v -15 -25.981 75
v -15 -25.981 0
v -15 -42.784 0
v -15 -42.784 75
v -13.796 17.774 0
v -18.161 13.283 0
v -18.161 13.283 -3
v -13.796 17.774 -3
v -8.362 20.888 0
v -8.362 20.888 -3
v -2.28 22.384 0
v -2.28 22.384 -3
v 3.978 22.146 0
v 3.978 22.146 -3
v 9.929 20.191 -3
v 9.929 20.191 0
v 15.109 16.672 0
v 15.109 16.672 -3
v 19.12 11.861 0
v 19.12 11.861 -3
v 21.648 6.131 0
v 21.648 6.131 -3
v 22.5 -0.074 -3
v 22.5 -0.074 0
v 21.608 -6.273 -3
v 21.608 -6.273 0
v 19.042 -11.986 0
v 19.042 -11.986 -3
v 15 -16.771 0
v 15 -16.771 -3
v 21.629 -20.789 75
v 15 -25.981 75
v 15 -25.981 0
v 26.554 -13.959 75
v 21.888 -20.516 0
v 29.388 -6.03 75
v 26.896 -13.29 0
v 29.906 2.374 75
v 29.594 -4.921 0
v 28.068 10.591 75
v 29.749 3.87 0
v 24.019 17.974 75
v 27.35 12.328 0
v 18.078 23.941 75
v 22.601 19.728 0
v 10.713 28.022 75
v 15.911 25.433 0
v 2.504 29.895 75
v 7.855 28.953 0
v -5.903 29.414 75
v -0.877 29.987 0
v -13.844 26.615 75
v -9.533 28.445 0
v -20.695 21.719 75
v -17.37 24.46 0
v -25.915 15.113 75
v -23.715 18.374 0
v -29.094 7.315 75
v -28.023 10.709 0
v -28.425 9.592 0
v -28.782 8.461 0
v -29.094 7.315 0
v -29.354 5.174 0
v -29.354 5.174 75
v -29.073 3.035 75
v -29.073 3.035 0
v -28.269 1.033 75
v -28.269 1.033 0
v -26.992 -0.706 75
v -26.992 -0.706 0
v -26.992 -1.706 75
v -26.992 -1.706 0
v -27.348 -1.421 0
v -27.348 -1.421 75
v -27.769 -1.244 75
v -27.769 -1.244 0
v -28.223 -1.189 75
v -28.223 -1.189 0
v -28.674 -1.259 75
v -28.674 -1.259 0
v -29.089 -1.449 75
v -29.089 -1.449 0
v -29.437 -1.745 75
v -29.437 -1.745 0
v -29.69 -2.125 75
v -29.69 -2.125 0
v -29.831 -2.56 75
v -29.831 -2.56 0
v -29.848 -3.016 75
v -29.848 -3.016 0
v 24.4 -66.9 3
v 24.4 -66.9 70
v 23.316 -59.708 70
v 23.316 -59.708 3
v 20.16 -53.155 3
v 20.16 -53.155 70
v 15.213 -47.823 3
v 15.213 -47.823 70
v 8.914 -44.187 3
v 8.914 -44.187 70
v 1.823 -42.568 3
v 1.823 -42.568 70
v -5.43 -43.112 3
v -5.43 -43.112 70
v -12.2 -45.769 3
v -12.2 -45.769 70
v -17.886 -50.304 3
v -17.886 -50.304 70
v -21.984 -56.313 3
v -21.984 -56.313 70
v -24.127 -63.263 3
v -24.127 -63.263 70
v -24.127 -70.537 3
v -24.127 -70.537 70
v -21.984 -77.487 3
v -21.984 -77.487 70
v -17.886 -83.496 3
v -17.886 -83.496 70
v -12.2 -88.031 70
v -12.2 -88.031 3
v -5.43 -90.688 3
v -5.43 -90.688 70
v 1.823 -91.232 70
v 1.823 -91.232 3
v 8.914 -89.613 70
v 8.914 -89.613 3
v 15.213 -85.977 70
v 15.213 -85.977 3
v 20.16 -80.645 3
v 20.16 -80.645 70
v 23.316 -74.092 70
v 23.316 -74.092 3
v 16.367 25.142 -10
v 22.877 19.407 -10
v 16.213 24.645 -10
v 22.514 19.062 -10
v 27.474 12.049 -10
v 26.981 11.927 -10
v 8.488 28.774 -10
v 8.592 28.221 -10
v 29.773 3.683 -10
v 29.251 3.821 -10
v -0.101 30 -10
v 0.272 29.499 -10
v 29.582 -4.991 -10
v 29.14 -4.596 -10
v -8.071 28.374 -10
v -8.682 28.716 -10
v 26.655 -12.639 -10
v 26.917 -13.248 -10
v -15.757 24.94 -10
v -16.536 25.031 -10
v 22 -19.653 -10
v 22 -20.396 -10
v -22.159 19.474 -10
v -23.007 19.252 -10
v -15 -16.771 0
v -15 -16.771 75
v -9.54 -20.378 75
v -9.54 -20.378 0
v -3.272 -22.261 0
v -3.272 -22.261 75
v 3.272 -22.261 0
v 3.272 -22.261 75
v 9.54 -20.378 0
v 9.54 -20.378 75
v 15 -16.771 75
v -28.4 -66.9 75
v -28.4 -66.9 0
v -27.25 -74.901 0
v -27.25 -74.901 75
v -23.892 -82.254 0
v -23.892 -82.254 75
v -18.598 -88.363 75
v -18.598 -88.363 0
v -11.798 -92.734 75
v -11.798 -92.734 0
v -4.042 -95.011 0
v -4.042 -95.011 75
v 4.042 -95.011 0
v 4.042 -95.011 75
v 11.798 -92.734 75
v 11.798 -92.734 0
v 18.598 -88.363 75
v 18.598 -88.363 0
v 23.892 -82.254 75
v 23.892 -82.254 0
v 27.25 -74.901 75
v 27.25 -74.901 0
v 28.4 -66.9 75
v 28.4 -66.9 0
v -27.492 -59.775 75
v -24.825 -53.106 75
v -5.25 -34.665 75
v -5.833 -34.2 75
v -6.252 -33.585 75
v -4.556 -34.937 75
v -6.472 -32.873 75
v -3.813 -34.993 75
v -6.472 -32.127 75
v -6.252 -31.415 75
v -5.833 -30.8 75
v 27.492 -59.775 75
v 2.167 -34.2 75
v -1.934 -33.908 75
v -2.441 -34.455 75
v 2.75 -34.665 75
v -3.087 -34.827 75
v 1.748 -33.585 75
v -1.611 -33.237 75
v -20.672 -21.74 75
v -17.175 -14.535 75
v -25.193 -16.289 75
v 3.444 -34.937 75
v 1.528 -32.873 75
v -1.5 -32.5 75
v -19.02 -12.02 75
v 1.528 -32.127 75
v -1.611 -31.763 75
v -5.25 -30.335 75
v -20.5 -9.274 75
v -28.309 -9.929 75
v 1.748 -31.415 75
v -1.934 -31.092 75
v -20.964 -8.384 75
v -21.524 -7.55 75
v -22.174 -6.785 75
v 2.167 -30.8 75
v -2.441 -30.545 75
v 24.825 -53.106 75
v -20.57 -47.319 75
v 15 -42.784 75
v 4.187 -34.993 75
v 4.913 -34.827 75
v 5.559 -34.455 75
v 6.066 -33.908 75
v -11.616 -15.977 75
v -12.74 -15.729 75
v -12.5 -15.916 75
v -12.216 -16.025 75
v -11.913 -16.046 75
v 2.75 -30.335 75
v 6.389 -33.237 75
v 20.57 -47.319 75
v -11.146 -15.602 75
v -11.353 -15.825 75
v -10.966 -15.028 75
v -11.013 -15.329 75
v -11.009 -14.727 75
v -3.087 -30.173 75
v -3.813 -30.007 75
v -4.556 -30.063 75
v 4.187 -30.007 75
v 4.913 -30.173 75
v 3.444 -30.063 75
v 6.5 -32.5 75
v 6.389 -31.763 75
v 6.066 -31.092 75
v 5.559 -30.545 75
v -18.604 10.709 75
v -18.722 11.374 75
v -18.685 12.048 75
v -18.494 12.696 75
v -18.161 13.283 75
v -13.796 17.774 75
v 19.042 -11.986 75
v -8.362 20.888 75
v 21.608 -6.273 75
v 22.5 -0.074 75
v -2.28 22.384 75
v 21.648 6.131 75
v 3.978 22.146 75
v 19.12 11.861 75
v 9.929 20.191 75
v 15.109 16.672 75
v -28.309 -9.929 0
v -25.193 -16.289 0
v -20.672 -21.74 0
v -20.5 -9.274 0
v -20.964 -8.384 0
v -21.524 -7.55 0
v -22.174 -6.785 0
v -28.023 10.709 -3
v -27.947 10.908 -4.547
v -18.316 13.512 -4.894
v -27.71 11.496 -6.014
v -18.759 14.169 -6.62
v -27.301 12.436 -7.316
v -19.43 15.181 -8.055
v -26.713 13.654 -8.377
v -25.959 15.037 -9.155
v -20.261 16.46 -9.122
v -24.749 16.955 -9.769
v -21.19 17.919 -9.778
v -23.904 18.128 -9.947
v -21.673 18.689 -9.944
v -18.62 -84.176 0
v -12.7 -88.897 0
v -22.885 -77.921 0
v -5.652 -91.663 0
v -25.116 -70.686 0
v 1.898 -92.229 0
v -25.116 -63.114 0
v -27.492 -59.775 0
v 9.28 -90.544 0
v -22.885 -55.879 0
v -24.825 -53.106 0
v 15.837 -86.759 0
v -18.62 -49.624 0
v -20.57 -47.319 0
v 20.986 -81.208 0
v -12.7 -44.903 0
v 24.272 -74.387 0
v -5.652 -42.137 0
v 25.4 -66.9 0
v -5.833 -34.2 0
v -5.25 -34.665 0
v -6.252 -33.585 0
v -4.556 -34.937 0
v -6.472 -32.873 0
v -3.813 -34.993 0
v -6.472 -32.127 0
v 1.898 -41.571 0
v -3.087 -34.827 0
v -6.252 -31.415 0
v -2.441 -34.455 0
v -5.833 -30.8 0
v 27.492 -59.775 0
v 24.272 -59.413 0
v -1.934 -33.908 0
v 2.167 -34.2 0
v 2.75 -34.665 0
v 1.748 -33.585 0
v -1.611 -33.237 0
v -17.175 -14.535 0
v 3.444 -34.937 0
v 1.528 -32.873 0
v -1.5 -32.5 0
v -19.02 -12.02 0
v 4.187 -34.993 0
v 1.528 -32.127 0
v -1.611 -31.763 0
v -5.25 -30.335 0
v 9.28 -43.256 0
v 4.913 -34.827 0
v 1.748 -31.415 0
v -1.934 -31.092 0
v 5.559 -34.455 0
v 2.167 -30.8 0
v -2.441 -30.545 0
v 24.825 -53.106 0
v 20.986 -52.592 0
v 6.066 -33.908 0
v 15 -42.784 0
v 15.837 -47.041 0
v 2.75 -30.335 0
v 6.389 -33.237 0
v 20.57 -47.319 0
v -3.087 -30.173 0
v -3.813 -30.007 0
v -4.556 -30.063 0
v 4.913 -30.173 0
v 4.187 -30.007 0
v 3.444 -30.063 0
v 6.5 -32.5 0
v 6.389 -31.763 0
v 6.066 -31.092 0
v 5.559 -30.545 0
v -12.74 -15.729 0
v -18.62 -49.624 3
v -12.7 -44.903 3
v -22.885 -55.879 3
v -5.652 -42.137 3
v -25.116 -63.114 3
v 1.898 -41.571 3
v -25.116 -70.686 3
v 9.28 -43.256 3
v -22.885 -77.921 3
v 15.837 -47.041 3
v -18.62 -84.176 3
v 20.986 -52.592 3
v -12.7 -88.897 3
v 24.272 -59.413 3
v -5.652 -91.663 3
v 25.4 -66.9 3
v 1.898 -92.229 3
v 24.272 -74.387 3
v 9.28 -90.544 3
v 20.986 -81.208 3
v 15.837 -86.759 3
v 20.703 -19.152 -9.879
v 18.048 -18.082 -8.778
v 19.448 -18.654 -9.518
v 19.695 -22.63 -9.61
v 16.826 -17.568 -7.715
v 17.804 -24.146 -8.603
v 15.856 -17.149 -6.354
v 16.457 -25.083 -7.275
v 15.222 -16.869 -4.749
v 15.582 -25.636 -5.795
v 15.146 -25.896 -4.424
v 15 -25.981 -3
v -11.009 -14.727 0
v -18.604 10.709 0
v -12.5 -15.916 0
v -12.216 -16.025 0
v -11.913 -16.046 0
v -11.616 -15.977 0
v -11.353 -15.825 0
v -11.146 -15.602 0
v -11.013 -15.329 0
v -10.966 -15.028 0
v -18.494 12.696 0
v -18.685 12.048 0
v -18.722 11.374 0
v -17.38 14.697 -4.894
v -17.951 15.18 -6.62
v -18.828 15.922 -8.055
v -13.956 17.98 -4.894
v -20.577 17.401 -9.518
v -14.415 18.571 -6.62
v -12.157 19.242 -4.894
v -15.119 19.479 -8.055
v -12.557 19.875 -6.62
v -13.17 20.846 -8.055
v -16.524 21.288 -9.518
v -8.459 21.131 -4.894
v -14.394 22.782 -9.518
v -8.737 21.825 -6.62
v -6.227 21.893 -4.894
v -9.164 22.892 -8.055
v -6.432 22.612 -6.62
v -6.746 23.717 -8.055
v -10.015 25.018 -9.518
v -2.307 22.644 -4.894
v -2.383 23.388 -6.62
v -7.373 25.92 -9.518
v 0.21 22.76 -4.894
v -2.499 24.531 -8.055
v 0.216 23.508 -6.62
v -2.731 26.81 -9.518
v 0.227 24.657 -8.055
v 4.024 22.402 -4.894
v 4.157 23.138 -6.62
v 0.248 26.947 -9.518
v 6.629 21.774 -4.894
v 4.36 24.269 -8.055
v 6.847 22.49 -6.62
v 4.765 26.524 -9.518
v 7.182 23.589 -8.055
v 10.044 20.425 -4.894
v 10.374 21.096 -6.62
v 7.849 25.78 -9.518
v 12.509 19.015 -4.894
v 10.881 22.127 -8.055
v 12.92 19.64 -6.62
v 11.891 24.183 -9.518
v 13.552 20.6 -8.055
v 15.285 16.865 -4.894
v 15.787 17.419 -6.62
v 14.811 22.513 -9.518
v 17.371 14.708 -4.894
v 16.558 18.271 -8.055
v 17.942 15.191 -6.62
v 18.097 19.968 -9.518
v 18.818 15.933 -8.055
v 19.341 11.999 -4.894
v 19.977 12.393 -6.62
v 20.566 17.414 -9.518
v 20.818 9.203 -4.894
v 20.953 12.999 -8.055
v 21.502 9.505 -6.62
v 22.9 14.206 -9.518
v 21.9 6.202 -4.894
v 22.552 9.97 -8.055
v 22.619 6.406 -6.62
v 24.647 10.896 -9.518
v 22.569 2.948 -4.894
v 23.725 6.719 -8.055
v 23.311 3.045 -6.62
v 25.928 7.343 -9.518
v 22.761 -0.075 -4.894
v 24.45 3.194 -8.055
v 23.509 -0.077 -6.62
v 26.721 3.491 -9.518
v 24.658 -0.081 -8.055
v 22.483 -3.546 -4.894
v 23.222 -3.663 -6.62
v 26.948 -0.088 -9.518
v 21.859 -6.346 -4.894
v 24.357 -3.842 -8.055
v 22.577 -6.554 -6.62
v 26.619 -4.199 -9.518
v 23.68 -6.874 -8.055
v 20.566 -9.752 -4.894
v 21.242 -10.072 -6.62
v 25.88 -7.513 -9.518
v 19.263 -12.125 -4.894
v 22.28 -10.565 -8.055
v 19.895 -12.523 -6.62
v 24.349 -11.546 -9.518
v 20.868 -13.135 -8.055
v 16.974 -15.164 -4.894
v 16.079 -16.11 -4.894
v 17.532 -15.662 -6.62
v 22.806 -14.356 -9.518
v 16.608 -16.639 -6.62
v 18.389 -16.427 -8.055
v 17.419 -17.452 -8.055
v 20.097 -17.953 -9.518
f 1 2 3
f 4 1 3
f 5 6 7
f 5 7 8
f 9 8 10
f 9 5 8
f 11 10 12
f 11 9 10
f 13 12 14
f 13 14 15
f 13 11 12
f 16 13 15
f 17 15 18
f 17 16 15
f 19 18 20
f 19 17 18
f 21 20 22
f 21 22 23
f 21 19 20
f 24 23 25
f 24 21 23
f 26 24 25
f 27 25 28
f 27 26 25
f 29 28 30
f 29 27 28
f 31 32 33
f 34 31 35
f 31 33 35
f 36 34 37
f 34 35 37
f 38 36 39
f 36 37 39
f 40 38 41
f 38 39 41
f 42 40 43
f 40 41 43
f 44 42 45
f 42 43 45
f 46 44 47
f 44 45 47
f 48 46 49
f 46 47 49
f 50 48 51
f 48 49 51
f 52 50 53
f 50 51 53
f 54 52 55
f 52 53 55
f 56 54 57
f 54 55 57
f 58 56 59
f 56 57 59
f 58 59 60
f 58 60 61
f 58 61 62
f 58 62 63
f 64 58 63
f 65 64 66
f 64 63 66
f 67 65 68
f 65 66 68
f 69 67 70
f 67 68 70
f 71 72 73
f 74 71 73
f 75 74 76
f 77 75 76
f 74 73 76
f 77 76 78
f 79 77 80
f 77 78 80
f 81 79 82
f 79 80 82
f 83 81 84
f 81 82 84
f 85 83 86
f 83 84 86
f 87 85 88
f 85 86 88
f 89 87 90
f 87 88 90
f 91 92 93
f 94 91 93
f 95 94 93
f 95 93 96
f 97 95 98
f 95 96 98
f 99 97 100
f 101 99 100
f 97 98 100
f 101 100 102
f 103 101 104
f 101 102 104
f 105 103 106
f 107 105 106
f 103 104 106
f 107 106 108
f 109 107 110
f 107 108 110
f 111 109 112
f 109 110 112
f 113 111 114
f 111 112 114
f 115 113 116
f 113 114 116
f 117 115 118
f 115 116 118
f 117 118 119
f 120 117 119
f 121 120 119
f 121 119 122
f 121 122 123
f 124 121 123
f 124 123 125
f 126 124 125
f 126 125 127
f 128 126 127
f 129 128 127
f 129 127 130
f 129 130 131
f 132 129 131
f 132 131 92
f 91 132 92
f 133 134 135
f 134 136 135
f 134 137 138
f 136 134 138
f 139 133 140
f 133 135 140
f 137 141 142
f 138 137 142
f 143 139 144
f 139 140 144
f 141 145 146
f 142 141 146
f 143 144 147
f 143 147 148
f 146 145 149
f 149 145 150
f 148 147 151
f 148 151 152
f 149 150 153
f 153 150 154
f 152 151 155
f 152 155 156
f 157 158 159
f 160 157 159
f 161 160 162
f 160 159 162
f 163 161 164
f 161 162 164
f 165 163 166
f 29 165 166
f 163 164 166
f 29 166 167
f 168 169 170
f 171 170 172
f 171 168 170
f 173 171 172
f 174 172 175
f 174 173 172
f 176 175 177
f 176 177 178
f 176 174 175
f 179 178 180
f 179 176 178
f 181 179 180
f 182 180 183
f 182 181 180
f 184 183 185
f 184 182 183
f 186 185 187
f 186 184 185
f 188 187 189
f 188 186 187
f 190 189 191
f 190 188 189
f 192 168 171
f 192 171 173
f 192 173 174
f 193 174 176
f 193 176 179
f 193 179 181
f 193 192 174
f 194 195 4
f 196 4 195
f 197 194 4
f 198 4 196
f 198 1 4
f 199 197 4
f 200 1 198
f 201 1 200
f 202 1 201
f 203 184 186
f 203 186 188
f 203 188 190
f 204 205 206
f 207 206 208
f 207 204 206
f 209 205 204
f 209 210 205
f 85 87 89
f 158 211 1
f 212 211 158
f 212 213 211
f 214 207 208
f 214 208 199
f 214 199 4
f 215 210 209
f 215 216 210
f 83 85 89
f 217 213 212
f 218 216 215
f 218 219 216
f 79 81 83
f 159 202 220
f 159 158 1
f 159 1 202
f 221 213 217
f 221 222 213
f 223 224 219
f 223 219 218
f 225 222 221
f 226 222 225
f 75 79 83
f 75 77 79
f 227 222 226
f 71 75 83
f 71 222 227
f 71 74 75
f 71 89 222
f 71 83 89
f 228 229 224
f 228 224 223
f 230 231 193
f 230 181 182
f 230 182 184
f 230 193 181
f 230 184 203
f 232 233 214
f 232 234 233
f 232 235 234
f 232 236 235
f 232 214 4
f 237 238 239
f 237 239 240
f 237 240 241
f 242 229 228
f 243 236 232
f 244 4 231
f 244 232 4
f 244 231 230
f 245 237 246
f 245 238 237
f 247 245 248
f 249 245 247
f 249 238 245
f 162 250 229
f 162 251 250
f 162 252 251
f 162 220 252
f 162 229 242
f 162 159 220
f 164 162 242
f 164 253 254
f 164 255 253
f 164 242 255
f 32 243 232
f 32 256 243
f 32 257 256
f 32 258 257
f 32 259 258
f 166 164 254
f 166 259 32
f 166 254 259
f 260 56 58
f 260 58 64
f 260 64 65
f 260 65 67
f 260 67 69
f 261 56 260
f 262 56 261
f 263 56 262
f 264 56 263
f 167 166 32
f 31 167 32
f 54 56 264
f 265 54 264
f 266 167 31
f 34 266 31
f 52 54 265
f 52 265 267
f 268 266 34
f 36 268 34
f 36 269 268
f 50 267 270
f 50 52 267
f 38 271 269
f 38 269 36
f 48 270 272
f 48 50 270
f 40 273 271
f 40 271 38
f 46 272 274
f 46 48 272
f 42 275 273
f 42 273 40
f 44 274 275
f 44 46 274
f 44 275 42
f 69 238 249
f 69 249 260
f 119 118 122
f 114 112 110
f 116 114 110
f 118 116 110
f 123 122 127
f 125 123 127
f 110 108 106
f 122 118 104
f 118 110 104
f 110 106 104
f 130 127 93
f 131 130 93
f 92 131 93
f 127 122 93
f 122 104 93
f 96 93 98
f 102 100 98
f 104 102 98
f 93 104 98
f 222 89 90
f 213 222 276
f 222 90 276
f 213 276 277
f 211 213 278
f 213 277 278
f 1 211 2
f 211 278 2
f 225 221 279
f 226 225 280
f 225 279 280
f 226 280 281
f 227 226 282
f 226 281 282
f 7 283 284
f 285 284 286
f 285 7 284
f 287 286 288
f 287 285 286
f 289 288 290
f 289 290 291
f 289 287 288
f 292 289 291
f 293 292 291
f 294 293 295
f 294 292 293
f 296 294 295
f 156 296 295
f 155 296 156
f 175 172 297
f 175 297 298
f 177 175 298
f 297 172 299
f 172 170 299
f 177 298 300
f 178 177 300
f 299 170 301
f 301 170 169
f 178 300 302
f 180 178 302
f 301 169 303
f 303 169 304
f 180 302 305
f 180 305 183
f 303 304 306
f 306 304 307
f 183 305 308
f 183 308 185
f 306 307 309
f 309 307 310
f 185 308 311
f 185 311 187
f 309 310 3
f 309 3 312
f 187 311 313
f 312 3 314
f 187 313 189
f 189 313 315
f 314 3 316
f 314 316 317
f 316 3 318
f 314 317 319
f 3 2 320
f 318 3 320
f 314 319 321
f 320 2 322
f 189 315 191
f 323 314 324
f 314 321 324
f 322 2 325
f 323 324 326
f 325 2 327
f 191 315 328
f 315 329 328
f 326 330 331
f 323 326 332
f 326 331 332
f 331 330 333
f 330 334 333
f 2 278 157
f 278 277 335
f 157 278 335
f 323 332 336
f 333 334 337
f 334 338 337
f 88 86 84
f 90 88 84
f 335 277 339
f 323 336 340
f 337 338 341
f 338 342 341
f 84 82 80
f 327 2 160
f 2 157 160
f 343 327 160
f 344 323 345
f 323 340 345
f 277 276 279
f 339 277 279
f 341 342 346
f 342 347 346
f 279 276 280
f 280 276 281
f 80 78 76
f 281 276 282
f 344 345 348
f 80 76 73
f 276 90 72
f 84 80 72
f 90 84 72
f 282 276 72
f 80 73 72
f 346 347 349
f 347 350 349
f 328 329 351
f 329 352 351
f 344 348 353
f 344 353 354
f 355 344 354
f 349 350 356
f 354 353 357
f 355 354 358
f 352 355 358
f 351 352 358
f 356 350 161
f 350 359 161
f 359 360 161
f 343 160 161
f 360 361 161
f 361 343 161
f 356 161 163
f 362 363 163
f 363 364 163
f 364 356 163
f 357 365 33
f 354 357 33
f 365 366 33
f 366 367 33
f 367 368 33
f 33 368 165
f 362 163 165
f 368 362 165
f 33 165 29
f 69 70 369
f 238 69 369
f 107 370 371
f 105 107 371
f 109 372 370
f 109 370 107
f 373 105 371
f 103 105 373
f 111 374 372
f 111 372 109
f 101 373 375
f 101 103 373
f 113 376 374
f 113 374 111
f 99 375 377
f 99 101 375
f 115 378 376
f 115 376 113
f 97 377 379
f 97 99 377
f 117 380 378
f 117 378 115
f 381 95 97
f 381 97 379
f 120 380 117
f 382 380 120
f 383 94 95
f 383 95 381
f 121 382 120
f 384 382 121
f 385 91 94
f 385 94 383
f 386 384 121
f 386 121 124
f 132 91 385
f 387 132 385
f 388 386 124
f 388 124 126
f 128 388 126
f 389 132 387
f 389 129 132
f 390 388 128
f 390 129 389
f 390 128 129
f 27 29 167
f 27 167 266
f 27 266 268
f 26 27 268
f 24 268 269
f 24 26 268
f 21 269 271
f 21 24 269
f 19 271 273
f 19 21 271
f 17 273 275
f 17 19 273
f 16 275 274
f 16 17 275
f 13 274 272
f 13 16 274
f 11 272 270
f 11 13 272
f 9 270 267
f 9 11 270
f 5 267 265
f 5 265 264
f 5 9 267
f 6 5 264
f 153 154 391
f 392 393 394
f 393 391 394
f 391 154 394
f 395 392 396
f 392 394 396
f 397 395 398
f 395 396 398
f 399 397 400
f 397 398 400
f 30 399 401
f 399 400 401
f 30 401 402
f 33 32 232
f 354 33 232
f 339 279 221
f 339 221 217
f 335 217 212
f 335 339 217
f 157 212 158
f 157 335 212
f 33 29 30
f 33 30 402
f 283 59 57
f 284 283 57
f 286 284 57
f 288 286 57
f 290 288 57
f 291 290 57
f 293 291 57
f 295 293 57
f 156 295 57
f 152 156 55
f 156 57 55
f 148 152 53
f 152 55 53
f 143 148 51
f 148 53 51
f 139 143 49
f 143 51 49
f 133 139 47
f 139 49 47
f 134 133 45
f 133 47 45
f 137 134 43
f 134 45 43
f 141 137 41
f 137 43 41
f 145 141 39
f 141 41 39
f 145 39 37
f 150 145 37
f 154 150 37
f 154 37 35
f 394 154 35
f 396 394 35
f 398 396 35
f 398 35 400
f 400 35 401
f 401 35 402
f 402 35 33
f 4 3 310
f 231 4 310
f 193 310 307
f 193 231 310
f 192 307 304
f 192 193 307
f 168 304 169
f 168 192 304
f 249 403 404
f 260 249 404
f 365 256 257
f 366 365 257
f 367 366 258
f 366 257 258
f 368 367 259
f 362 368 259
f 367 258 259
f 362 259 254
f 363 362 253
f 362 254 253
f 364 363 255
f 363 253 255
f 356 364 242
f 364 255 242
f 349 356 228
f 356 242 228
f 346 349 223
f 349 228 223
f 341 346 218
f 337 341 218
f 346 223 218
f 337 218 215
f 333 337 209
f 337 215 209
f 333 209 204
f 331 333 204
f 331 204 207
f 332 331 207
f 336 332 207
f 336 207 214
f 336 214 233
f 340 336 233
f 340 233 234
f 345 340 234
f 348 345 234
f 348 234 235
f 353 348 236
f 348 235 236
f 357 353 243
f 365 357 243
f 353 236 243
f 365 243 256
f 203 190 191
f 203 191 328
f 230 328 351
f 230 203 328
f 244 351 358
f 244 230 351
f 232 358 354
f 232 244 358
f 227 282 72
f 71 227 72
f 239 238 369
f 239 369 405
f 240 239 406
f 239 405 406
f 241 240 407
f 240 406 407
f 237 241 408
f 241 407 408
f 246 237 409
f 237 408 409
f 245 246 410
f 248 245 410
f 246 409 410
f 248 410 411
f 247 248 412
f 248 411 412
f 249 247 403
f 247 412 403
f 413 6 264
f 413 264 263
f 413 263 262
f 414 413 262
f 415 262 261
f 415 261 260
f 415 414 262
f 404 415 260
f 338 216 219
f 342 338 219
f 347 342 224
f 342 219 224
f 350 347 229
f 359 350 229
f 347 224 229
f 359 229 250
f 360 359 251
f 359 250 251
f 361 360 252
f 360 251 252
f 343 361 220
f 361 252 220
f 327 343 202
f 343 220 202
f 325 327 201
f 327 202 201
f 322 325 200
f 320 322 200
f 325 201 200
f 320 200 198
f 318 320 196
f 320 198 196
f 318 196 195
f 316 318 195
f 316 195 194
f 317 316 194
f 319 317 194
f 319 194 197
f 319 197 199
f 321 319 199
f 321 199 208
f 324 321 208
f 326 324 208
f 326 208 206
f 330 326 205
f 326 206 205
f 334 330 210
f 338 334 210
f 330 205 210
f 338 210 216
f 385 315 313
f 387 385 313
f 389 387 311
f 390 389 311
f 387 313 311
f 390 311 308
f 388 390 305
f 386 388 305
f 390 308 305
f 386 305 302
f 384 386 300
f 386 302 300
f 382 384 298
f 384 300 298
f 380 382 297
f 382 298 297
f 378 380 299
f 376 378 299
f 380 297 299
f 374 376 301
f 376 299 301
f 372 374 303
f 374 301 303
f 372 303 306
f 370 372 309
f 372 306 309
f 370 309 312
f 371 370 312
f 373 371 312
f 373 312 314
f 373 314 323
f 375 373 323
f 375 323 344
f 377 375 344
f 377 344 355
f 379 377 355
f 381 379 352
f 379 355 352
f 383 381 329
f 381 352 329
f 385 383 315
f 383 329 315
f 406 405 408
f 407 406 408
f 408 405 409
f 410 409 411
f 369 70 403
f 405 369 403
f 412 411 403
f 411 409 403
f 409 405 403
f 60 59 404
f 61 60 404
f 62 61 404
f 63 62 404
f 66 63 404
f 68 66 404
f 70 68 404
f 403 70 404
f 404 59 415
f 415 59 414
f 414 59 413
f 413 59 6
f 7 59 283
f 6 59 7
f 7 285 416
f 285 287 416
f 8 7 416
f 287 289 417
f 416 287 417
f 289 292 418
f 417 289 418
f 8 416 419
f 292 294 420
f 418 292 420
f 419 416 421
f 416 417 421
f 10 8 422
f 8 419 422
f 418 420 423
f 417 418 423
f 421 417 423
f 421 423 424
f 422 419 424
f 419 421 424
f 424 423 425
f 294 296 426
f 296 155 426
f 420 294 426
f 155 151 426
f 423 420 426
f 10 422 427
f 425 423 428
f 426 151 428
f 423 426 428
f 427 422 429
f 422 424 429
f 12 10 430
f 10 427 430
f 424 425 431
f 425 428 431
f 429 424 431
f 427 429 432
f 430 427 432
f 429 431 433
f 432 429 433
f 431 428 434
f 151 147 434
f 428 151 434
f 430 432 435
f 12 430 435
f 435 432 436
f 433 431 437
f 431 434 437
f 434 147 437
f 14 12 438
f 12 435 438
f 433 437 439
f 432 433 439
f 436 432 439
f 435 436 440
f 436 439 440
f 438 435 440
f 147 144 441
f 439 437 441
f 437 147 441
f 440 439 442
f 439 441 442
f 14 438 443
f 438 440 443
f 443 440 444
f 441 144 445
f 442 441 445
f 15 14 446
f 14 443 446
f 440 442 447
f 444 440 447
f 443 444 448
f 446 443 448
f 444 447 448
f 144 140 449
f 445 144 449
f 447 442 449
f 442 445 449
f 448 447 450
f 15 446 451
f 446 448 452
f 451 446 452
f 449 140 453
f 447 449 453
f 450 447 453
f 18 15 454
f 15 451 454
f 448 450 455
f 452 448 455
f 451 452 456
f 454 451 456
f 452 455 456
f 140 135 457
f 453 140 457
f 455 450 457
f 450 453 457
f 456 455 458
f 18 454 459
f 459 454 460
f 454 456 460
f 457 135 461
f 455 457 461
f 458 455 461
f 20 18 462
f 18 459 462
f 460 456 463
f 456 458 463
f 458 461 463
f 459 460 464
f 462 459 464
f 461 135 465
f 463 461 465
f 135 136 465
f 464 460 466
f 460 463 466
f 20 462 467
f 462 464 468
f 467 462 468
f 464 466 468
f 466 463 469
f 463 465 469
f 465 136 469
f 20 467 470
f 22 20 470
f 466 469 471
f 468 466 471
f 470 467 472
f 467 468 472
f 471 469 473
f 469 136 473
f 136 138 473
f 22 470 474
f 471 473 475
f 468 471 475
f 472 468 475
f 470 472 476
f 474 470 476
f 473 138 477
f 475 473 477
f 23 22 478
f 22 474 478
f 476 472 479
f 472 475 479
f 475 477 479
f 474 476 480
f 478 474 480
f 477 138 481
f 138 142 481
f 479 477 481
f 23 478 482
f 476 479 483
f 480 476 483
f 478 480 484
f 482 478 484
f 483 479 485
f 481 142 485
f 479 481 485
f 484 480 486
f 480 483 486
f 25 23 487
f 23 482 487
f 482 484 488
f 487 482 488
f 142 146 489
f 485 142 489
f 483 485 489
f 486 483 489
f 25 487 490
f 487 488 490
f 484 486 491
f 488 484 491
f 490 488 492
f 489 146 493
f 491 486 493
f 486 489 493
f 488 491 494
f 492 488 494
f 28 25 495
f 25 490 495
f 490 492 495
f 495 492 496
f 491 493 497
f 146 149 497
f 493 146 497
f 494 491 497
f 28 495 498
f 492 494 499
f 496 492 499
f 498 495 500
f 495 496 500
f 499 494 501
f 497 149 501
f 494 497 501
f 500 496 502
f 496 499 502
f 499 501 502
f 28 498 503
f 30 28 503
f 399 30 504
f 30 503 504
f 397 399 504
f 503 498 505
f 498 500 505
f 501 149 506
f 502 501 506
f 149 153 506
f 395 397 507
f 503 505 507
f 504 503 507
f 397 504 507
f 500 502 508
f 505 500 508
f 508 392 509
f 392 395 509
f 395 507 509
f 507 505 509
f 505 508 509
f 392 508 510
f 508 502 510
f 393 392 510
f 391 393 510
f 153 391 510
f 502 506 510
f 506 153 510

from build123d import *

# Parameters (mm, degrees)
PAD_DEPTH     = 75
SKETCH001_R   = 24.4
SKETCH001_R_2 = 2.5
PAD001_DEPTH  = 75
SKETCH003_R   = 24.4
PAD002_DEPTH  = 5
SKETCH004_R   = 25.4
POCKET_DEPTH  = 3
PAD003_DEPTH  = 10
FILLET_R      = 7


with BuildPart() as part:
    # Sketch → Pad (new body)
    with BuildSketch(Plane.XY):
        with BuildLine():
            ThreePointArc((-29.848016, -3.015947), (29.920505, -2.182515), (-29.094406, 7.315431))
            ThreePointArc((-29.094406, 7.315431), (-29.072912, 3.034578), (-26.991574, -0.706304))
            Line((-26.991574, -0.706304), (-12.739759, -15.728805))
            ThreePointArc((-12.739759, -15.728805), (-11.4789, -15.911046), (-11.008743, -14.727014))
            Line((-11.008743, -14.727014), (-18.604437, 10.709188))
            ThreePointArc((-18.160969, 13.282665), (-18.684551, 12.047942), (-18.604437, 10.709188))
            ThreePointArc((-20.499669, -9.27435), (22.380035, -2.320351), (-18.160969, 13.282665))
            ThreePointArc((-20.499669, -9.27435), (-21.232479, -7.959372), (-22.173804, -6.784601))
            Line((-22.173804, -6.784601), (-26.991574, -1.706304))
            ThreePointArc((-26.991574, -1.706304), (-28.888073, -1.339771), (-29.848016, -3.015947))
        make_face()
    extrude(amount=PAD_DEPTH)

    # Sketch001 (on DatumPlane) → Pad001 (join)
    with BuildSketch(Plane.XY.offset(75)):
        with BuildLine():
            ThreePointArc((-28.4, -66.9), (0, -95.3), (28.4, -66.9))
            ThreePointArc((28.4, -66.9), (24.824987, -53.105798), (15, -42.784445))
            Line((15, -16.77051), (15, -42.784445))
            ThreePointArc((-15, -16.77051), (0, -22.5), (15, -16.77051))
            Line((-15, -16.77051), (-15, -42.784445))
            ThreePointArc((-15, -42.784445), (-24.824987, -53.105798), (-28.4, -66.9))
        make_face()
        with Locations((0, -66.9)):
            Circle(SKETCH001_R, mode=Mode.SUBTRACT)
        with Locations((-4, -32.5)):
            Circle(SKETCH001_R_2, mode=Mode.SUBTRACT)
        with Locations((4, -32.5)):
            Circle(SKETCH001_R_2, mode=Mode.SUBTRACT)
    extrude(amount=-PAD001_DEPTH)

    # Sketch003 (on DatumPlane) → Pad002 (join)
    with BuildSketch(Plane.XY.offset(75)):
        with Locations((0, -66.9)):
            Circle(SKETCH003_R)
    extrude(amount=-PAD002_DEPTH)

    # Sketch004 (on DatumPlane) → Pocket (cut)
    with BuildSketch(Plane(origin=(0, 0, 0), x_dir=(1, 0, 0), z_dir=(0, 0, -1))):
        with Locations((0, 66.9)):
            Circle(SKETCH004_R)
    extrude(amount=-POCKET_DEPTH, mode=Mode.SUBTRACT)

    # Sketch005 (on DatumPlane) → Pad003 (join)
    with BuildSketch(Plane(origin=(0, 0, 0), x_dir=(1, 0, 0), z_dir=(0, 0, -1))):
        with BuildLine():
            Line((-28.023442, -10.709188), (-18.160969, -13.282665))
            ThreePointArc((-18.160969, -13.282665), (15.109476, -16.671944), (15, 16.77051))
            Line((15, 16.77051), (15, 25.980762))
            ThreePointArc((-28.023442, -10.709188), (19.466397, -22.826725), (15, 25.980762))
        make_face()
    extrude(amount=PAD003_DEPTH)

    # Fillet
    fillet_edges = [part.edges().sort_by_distance(p)[0] for p in [
        (15.109476, 16.671944, -10),
        (-23.092205, 11.995927, -10),
        (15, -21.375636, -10),
    ]]
    fillet(fillet_edges, radius=FILLET_R)


solid = part.part
